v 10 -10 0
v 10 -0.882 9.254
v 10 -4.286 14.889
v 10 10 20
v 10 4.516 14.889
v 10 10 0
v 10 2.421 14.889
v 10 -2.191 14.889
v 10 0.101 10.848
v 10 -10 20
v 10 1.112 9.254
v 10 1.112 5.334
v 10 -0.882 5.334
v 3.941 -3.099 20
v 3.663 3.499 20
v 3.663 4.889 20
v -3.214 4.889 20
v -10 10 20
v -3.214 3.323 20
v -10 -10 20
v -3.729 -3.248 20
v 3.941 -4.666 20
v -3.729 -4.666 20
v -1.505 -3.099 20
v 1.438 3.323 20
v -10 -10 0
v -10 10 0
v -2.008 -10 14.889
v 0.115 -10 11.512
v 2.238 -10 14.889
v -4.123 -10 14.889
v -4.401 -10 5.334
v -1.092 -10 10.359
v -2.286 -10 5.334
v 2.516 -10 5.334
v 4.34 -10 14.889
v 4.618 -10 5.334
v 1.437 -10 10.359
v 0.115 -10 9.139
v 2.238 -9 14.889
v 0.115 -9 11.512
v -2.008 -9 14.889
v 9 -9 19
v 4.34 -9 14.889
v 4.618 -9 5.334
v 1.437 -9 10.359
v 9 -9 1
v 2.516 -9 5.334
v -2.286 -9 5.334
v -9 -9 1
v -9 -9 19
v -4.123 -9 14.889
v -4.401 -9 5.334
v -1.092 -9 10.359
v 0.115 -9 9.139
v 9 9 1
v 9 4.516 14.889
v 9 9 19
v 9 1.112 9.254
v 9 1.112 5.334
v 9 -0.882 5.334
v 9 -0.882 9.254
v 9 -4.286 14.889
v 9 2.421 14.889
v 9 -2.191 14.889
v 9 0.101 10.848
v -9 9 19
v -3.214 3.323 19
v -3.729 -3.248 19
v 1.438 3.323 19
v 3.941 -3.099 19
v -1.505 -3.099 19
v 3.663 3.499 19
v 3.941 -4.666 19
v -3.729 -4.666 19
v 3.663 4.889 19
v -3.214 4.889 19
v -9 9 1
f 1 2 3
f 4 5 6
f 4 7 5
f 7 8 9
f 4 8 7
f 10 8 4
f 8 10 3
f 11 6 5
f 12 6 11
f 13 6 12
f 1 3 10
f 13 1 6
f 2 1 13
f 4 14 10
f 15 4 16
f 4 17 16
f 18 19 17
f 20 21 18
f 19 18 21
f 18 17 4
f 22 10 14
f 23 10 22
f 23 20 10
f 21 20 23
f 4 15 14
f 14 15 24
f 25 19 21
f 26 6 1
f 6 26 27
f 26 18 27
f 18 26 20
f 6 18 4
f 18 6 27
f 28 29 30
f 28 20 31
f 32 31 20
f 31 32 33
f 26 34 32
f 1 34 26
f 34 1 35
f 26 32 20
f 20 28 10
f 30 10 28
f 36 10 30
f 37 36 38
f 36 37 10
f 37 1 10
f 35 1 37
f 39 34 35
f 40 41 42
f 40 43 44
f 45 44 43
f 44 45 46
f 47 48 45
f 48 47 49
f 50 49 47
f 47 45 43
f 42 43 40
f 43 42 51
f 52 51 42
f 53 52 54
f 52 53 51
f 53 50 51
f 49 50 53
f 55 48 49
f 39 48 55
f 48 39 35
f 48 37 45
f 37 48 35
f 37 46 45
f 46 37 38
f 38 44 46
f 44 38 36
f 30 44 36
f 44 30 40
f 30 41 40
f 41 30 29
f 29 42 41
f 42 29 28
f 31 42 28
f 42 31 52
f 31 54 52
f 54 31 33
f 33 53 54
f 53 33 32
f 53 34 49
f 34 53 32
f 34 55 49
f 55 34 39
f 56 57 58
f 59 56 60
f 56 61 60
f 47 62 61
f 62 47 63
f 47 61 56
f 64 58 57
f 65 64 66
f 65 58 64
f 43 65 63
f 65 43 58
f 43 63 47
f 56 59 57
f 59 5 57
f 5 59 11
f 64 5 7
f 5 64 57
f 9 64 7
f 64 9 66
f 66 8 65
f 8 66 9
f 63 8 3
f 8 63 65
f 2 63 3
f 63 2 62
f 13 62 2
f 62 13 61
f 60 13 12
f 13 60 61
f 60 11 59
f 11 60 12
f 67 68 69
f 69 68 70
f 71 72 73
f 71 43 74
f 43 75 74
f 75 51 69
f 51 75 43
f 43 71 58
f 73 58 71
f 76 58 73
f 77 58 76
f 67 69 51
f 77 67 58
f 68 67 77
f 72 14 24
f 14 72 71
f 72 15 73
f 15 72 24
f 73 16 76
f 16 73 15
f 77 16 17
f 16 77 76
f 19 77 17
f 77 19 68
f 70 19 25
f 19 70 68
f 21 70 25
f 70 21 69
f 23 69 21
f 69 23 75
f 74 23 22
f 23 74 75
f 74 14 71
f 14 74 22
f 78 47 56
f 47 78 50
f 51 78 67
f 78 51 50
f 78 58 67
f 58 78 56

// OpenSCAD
// XYZ 20mm Hollow Calibration Cube
// Based on the design proposed by iDig3Dprinting https://www.thingiverse.com/thing:1278865
// Freely adapted by 5@xes

font = "Arial:style=Bold";

$fn=100;

cube_size = 20;
letter_size = 0.5*cube_size;
letter_height = 0.2*letter_size;

o = cube_size / 2 - letter_height / 2;

module letter(Txt) {
  color("Yellow")
  linear_extrude(height = letter_height) {
    text(Txt, size = letter_size, font = font, halign = "center", valign = "center");
  }
}

translate([0, 0, 10]) difference() {
  color("gray") 
  cube(cube_size, center = true);
  translate([0, -o, 0]) rotate([90, 0, 0]) letter("X");
  translate([o, 0, 0]) rotate([90, 0, 90]) letter("Y");
  translate([0, 0, o])  letter("Z");
  cube((cube_size-letter_height), center = true);
}
